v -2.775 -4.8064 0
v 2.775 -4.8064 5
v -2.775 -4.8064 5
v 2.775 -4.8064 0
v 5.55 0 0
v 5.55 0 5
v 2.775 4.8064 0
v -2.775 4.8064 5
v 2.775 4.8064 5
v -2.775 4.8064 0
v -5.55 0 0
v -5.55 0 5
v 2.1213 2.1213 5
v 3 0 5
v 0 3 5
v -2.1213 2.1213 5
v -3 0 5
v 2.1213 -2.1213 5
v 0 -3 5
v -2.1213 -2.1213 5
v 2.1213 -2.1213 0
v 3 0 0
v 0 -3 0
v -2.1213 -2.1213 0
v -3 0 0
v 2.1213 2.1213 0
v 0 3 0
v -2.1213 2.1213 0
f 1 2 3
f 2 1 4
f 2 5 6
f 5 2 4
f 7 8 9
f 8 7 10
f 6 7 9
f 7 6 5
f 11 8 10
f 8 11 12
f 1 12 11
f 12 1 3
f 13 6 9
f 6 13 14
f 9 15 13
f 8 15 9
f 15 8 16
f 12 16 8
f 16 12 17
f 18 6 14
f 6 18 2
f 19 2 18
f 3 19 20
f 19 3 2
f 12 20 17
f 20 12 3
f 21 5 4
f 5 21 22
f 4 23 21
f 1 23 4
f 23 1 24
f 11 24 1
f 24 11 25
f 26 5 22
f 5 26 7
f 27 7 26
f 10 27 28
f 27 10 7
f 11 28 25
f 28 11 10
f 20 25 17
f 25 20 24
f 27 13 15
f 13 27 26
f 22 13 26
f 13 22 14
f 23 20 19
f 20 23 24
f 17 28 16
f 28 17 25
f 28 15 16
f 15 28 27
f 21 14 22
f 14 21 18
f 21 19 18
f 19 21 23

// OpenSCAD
// file: ../../settings/scad/global.scad
fn = 1;

shaftX_posZ = 100;

shaftY_posX = 100;

shaftZ_posY = 150;

lnBase = 300;			//lengthBase
lnConnect = 50;		//lengthConnect
lnNuts = 10;			//lengthNuts
lnNutsShift = 2;		//M8 Nut ~ 6 mm, so +2 mm from both side will give a lnNuts 10mm value 

Mx = 8;
correction=1;
M = Mx-correction; //use M8 threaded bars
M_2 = M/2;
Mx_2 = Mx/2;
// main file
//Muts
include <../../settings/scad/global.scad>

fnl = fn; //fn local

//Mx = [rInt, rExt, height]
M3 = [1.5, 3, 2.2];
M4 = [2, 3.85, 3];
M5 = [2.5, 4.4, 4.5];
M6 = [3, 5.55, 5];
M8 = [4, 7.2, 6.44];
//M = [,,];


module nut_Mx(rInt=4,rExt=7.2,height=6.44){
		difference(){
			cylinder(height,rExt,rExt, $fn=6);
			translate([0,0,-1])
			cylinder(height+2,rInt,rInt, $fn=4*2*fnl);
		}
}

module nut_M3(){
	nut_Mx(M3[0], M3[1], M3[2]);
}
module nut_M4(){
	nut_Mx(M4[0], M4[1], M4[2]);
}
module nut_M5(){
	nut_Mx(M5[0], M5[1], M5[2]);
}
module nut_M6(){
	nut_Mx(M6[0], M6[1], M6[2]);
}
module nut_M8(){
	nut_Mx(M8[0], M8[1], M8[2]);
}

nut_M6();

module nut_M8_x(posX=0,posY=0,posZ=0){
	translate([posX,posY,posZ])
		rotate([0,90,0])
			color("grey")
				nut_M8();
}

module nut_M8_y(posX=0,posY=0,posZ=0){
	translate([posX,posY,posZ])
		rotate([-90,0,0])
			color("lightgrey")
				nut_M8();
}
module nut_M8_z(posX=0,posY=0,posZ=0){
	translate([posX,posY,posZ])
		rotate([0,0,90])
			color("darkgrey")
				nut_M8();
}
